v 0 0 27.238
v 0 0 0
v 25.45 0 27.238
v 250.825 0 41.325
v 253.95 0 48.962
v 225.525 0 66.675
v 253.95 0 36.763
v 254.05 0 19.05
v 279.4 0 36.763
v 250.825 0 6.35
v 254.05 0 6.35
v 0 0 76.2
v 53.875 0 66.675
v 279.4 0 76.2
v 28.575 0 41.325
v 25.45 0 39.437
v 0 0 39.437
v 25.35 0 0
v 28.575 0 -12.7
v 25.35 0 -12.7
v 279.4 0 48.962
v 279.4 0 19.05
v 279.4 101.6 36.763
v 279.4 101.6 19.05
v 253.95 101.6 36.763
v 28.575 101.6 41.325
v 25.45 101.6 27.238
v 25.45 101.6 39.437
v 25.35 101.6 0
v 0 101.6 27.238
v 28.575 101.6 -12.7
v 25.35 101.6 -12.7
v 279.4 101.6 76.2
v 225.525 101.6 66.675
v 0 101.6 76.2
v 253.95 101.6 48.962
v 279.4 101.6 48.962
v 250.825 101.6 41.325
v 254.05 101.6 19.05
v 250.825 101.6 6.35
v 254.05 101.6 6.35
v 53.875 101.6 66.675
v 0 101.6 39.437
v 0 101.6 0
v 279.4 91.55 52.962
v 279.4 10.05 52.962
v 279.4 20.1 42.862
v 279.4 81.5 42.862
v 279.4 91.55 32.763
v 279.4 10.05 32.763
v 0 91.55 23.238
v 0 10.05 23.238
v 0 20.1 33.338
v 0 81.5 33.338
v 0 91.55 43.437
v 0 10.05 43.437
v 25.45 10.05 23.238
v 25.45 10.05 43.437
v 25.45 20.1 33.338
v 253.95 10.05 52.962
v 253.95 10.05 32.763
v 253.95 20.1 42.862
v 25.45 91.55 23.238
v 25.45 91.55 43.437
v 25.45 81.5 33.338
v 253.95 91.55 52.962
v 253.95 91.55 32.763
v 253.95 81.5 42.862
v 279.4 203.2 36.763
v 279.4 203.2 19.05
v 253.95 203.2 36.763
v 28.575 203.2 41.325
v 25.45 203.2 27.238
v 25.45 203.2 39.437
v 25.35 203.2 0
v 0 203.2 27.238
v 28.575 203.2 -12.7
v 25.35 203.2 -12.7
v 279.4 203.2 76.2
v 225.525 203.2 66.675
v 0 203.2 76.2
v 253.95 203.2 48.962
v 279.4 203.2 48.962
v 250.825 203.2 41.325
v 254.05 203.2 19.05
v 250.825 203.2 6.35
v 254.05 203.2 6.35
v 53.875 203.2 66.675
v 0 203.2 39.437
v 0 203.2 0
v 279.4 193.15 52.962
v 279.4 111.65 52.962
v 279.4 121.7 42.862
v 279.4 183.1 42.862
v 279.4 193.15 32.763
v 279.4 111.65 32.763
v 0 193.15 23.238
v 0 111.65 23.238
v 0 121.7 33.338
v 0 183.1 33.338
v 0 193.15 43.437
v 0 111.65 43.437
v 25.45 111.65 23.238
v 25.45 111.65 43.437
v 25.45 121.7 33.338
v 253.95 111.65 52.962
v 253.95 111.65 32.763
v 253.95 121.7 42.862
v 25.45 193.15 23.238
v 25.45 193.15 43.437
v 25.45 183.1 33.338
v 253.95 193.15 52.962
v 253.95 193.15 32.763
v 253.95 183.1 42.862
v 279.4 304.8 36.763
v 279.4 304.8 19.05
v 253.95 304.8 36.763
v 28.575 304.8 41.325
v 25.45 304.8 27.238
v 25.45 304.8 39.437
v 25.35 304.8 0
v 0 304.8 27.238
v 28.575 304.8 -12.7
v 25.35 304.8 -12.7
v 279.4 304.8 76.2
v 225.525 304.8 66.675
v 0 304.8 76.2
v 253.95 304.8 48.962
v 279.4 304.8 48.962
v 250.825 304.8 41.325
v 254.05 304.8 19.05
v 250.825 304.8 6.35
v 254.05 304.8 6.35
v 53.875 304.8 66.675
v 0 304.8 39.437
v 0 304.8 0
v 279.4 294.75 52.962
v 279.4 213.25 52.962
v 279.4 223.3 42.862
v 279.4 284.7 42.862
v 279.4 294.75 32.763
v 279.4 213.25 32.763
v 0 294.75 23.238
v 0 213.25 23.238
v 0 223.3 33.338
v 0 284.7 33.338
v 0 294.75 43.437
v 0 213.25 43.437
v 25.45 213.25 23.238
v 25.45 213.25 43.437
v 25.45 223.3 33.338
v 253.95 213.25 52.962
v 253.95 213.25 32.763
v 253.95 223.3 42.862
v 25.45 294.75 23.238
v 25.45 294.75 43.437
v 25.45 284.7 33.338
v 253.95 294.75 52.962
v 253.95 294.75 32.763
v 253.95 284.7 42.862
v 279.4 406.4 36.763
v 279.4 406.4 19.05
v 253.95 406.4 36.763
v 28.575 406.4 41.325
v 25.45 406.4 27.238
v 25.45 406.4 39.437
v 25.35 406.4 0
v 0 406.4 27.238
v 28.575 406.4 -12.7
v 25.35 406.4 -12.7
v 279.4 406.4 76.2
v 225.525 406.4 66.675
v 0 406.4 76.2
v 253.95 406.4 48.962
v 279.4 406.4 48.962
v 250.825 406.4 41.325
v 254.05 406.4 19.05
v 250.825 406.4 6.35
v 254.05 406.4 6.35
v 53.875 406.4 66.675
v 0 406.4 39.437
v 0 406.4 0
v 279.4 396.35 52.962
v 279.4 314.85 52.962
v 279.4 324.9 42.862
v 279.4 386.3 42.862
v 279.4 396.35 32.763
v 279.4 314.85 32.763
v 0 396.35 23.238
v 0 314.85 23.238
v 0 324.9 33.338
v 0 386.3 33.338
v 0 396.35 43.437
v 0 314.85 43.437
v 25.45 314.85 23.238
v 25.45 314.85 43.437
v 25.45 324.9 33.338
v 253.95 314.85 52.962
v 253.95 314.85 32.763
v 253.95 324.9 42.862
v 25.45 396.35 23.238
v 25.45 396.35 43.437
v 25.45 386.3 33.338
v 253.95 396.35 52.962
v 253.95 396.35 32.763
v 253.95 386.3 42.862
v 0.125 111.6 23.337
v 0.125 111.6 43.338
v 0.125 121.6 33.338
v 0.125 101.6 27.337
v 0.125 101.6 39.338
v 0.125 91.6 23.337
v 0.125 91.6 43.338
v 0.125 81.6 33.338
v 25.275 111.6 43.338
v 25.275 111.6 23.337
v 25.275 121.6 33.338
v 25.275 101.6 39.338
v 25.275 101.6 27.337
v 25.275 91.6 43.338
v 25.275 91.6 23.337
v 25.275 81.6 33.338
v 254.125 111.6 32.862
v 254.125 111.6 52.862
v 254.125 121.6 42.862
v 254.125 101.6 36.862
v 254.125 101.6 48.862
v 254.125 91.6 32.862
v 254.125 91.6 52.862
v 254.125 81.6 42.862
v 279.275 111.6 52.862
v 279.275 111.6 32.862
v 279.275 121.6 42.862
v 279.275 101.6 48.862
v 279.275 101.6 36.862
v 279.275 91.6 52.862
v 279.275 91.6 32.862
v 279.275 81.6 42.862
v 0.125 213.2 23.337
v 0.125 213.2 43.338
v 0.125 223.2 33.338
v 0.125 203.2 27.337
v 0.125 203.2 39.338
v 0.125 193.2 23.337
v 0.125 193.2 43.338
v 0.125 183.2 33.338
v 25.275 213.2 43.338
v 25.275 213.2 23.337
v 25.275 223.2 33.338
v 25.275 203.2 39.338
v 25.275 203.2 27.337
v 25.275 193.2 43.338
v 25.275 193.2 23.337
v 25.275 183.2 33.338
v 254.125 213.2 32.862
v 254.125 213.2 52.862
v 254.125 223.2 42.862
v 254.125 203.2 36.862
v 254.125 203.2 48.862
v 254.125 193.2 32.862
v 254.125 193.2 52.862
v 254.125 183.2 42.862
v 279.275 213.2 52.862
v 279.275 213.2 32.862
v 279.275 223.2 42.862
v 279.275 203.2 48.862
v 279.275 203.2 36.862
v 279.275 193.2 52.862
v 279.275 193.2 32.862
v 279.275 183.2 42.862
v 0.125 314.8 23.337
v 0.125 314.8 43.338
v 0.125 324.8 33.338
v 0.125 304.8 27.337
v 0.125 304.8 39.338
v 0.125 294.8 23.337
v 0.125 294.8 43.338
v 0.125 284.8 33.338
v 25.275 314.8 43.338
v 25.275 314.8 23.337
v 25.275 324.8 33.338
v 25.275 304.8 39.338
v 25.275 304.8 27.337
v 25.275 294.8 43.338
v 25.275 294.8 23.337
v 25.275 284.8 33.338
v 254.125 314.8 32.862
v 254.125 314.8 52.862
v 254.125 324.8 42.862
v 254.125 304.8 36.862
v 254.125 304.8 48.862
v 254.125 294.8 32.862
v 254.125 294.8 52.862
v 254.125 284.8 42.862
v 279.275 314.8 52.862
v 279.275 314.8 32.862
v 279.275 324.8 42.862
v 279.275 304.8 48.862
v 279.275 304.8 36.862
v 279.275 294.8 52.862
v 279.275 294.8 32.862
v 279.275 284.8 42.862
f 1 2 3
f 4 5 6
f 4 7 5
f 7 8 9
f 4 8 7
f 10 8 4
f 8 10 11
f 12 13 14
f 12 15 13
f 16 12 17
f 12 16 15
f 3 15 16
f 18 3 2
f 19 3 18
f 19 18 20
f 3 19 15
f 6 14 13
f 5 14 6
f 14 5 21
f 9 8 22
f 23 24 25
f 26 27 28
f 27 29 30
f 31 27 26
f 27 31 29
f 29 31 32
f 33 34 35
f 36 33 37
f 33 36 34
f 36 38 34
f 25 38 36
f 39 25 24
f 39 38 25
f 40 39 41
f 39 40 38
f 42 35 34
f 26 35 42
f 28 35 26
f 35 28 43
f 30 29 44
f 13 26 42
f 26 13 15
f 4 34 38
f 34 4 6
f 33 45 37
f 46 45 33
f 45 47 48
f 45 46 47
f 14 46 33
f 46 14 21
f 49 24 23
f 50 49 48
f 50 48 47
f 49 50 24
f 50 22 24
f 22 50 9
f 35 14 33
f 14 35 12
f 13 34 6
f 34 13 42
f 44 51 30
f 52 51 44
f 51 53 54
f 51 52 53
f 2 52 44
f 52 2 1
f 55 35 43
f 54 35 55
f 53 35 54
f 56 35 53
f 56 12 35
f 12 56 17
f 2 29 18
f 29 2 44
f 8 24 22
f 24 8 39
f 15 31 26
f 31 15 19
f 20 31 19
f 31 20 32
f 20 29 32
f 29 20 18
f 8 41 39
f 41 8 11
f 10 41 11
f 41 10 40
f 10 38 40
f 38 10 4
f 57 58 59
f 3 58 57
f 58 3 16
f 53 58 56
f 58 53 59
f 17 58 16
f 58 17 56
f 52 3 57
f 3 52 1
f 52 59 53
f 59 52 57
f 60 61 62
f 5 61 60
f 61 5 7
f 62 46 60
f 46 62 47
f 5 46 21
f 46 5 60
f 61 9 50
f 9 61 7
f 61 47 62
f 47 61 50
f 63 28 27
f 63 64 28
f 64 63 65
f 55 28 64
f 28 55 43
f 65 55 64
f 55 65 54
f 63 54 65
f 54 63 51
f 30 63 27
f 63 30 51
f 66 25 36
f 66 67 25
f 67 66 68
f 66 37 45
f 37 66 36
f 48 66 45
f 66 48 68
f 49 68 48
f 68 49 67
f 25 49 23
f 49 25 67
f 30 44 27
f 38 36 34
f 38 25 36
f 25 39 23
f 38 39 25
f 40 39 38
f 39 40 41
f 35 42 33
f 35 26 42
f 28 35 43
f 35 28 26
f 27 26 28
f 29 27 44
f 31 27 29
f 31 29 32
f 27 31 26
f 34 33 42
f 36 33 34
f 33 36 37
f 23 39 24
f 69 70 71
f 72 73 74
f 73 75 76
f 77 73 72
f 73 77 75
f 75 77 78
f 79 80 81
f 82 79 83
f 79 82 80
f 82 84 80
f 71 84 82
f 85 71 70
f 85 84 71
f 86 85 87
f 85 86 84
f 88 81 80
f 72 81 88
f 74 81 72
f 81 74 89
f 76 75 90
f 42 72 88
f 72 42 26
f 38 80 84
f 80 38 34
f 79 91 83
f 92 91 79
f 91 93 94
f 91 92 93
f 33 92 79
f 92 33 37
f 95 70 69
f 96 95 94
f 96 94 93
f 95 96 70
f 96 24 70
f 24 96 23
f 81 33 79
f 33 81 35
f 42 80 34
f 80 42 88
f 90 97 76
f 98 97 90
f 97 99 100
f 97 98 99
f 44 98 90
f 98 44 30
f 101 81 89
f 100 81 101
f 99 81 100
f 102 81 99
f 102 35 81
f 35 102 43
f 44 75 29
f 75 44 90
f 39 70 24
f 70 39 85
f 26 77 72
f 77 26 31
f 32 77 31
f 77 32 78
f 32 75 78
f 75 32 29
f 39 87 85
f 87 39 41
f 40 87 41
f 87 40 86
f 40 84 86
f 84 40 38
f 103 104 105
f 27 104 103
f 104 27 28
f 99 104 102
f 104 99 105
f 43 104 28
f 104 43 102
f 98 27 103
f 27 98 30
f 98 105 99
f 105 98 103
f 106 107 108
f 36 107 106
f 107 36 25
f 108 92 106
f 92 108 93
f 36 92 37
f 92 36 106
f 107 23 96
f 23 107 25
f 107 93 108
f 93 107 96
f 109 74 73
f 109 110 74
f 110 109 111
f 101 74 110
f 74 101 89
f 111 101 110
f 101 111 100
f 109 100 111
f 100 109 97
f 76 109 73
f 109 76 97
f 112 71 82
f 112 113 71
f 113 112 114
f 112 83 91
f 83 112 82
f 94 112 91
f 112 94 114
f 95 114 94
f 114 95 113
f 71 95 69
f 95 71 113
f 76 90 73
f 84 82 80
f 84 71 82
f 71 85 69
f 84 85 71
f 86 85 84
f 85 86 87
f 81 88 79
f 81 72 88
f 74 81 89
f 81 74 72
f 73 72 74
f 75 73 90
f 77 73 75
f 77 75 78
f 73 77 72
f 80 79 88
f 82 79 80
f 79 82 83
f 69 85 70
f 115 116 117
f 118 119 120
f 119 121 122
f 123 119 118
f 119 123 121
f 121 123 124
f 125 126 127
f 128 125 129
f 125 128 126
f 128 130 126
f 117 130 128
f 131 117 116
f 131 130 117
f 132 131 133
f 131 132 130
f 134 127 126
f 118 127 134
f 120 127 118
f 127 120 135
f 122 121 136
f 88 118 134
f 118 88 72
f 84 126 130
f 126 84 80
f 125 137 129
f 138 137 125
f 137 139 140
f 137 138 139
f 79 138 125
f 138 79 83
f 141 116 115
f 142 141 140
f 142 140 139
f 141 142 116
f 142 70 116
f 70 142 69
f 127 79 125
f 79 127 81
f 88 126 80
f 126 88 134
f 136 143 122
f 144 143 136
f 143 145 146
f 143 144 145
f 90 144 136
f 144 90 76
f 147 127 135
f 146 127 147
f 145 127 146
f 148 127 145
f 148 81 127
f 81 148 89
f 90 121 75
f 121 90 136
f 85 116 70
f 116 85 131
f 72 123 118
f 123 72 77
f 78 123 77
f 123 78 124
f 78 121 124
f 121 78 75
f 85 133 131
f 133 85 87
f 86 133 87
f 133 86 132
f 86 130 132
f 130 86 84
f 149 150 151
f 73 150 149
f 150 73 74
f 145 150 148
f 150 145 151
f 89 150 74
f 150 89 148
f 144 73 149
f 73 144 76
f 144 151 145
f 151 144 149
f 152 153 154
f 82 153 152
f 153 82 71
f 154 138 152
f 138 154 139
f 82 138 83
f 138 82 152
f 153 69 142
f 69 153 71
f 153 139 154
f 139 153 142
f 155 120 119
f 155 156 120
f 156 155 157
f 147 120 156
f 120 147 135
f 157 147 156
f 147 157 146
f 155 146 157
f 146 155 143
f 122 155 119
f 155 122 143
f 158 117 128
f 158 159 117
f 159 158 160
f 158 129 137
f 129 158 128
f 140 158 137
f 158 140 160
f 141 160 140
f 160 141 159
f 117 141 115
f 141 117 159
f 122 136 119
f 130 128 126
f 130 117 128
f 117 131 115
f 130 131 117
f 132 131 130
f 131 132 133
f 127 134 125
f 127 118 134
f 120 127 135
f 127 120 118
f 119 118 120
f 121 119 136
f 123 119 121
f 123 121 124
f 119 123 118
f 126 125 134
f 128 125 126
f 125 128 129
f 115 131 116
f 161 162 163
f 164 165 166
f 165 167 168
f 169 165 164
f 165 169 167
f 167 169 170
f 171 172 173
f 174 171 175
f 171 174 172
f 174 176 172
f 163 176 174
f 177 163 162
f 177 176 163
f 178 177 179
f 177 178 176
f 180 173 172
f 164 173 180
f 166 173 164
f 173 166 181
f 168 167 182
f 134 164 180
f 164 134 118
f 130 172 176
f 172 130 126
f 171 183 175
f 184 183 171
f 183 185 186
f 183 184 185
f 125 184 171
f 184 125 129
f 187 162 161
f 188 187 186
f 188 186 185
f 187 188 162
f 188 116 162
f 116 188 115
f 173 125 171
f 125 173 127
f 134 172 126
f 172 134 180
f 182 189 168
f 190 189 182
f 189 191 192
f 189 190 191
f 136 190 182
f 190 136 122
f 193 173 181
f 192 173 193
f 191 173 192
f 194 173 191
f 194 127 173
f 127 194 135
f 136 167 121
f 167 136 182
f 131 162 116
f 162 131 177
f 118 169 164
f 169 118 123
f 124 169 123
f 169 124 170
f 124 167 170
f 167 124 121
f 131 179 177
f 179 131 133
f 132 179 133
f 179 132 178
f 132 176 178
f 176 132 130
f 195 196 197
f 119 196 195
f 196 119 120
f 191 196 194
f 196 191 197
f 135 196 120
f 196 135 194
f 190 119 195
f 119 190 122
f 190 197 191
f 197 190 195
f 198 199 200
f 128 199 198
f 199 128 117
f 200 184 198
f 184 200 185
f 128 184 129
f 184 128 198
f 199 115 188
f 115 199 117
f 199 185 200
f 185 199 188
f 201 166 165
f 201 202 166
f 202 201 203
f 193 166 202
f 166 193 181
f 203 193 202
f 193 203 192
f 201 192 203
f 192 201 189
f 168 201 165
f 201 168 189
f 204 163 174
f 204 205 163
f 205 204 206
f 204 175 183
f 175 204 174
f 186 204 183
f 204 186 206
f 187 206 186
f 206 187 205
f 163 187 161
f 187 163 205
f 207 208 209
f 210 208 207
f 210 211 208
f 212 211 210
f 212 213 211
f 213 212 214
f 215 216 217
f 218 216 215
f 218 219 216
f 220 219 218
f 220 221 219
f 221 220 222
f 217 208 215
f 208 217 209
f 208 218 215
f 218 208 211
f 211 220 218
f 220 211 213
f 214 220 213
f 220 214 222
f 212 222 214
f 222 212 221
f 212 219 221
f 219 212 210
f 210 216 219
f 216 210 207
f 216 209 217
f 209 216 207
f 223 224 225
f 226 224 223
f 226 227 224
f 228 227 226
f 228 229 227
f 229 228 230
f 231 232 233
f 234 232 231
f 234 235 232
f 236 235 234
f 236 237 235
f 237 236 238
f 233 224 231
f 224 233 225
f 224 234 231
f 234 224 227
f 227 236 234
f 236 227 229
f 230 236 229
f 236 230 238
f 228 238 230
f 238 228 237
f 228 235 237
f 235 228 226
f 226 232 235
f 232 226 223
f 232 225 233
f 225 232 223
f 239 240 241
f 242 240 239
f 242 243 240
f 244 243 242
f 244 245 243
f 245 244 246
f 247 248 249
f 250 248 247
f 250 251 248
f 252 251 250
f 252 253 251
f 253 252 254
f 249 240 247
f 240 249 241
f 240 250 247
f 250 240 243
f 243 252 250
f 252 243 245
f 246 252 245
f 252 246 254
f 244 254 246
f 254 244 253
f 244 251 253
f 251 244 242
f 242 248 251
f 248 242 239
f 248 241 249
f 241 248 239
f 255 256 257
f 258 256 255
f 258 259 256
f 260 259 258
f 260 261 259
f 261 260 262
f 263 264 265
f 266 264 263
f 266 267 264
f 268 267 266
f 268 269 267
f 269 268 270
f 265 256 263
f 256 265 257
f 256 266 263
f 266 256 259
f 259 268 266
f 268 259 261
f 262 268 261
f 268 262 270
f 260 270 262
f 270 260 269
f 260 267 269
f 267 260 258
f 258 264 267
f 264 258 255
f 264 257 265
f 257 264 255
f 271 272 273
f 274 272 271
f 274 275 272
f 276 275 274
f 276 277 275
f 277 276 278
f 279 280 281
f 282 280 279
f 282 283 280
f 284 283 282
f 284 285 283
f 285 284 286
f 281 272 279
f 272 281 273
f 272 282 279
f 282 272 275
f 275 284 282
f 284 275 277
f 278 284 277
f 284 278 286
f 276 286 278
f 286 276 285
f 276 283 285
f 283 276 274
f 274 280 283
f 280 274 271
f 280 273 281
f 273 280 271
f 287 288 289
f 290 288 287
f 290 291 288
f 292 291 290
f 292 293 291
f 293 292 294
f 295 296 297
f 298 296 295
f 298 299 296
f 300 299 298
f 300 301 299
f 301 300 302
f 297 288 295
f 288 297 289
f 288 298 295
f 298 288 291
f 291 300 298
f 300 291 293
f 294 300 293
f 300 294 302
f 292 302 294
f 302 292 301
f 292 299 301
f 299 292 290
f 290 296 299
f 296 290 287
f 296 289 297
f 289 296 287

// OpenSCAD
/*
 * Modular desk extender
 *
 * Flatpak STL exports (run from this file's directory):
 *   flatpak run org.openscad.OpenSCAD -o desk-extender-chunk.stl -D 'part="chunk"' desk_extender.scad
 *   flatpak run org.openscad.OpenSCAD -o desk-extender-keys.stl -D 'part="keys"' desk_extender.scad
 *   flatpak run org.openscad.OpenSCAD -o desk-extender-fit-test.stl -D 'part="fit_test"' desk_extender.scad
 *
 * Coordinate system in the assembled preview:
 *   X = chest of drawers (left) to electronics desk (right)
 *   Y = front of the furniture to the AS/400
 *   Z = height above the chest of drawers
 *
 * Set `part` to "chunk", "keys", or "fit_test" before exporting an STL.
 */

$fn = 48;

part = "assembled"; // [assembled, chunk, keys, fit_test]

// Assembly configuration
chunk_count = 4;
chunk_depth_in = 4;

// Measured furniture geometry
gap_width_in = 9;
left_overlap_in = 1;
right_overlap_in = 1;
target_rise_in = 3;
desk_height_difference_in = 0.75;
bridge_thickness_in = 3/8;

// Side-to-side locating lips
locating_lip_depth_in = 1/2;
locating_lip_thickness_in = 1/8;
furniture_edge_clearance = 0; // Confirmed by physical fit test

// Corner gussets
gusset_run_in = 1;
gusset_drop_in = 1;

// Removable bow-tie key tuning (millimeters)
key_length = 40;
key_outer_height = 20;
key_neck_height = 12;
key_side_clearance = 0.20; // Added to overall slot dimensions
key_thickness_clearance = 0.25;

inch = 25.4;
epsilon = 0.05;

gap_width = gap_width_in * inch;
left_overlap = left_overlap_in * inch;
right_overlap = right_overlap_in * inch;
extender_width = left_overlap + gap_width + right_overlap;
target_rise = target_rise_in * inch;
desk_height_difference = desk_height_difference_in * inch;
bridge_thickness = bridge_thickness_in * inch;
locating_lip_depth = locating_lip_depth_in * inch;
locating_lip_thickness = locating_lip_thickness_in * inch;
gusset_run = gusset_run_in * inch;
gusset_drop = gusset_drop_in * inch;
bridge_bottom = target_rise - bridge_thickness;
chunk_depth = chunk_depth_in * inch;
key_thickness = min(left_overlap, right_overlap) - key_thickness_clearance;
left_key_z = bridge_bottom / 2;
right_key_z = (desk_height_difference + bridge_bottom) / 2;

module bridge_solid(depth = chunk_depth) {
    union() {
        // Horizontal load surface.
        translate([0, 0, bridge_bottom])
            cube([extender_width, depth, bridge_thickness]);

        // Left support rests on the 32-inch chest of drawers.
        cube([left_overlap, depth, bridge_bottom + epsilon]);

        // Right support stops 0.75 inch higher to rest on the desk.
        translate([
            left_overlap + gap_width,
            0,
            desk_height_difference
        ])
            cube([
                right_overlap,
                depth,
                bridge_bottom - desk_height_difference + epsilon
            ]);

        // These two lips hang inside the furniture gap and merge into the
        // supports above. They extend below the adjacent furniture tops to
        // prevent the extender shifting sideways into the gap.
        translate([
            left_overlap - epsilon + furniture_edge_clearance,
            0,
            -locating_lip_depth
        ])
            cube([
                locating_lip_thickness + epsilon,
                depth,
                bridge_bottom + locating_lip_depth + epsilon
            ]);

        translate([
            left_overlap + gap_width
                - furniture_edge_clearance
                - locating_lip_thickness,
            0,
            desk_height_difference - locating_lip_depth
        ])
            cube([
                locating_lip_thickness + epsilon,
                depth,
                bridge_bottom
                    - desk_height_difference
                    + locating_lip_depth
                    + epsilon
            ]);

        continuous_gussets(depth);
    }
}

// Extrudes a polygon drawn in X/Z coordinates along the Y axis.
module xz_prism(points, y, thickness) {
    multmatrix([
        [1, 0, 0, 0],
        [0, 0, 1, y],
        [0, 1, 0, 0],
        [0, 0, 0, 1]
    ])
        linear_extrude(height = thickness)
            polygon(points);
}

module continuous_gussets(depth) {
    left_anchor = left_overlap + locating_lip_thickness - epsilon;
    right_anchor = left_overlap + gap_width - locating_lip_thickness + epsilon;

    xz_prism([
        [left_anchor, bridge_bottom + epsilon],
        [left_anchor + gusset_run, bridge_bottom + epsilon],
        [left_anchor, bridge_bottom - gusset_drop]
    ], 0, depth);

    xz_prism([
        [right_anchor, bridge_bottom + epsilon],
        [right_anchor, bridge_bottom - gusset_drop],
        [right_anchor - gusset_run, bridge_bottom + epsilon]
    ], 0, depth);
}

function bow_tie_points(length, outer_height, neck_height) = [
    [-length / 2, 0],
    [-length / 4,  outer_height / 2],
    [0,             neck_height / 2],
    [length / 4,   outer_height / 2],
    [length / 2,   0],
    [length / 4,  -outer_height / 2],
    [0,            -neck_height / 2],
    [-length / 4, -outer_height / 2]
];

// Extrudes a Y/Z bow-tie profile along X.
module bow_tie_prism(
    x,
    y,
    z,
    thickness,
    length = key_length,
    outer_height = key_outer_height,
    neck_height = key_neck_height
) {
    multmatrix([
        [0, 0, 1, x],
        [1, 0, 0, y],
        [0, 1, 0, z],
        [0, 0, 0, 1]
    ])
        linear_extrude(height = thickness)
            polygon(bow_tie_points(length, outer_height, neck_height));
}

module key_slot_pair(y) {
    slot_length = key_length + key_side_clearance;
    slot_outer_height = key_outer_height + key_side_clearance;
    slot_neck_height = key_neck_height + key_side_clearance;

    bow_tie_prism(
        -epsilon,
        y,
        left_key_z,
        left_overlap + 2 * epsilon,
        slot_length,
        slot_outer_height,
        slot_neck_height
    );
    bow_tie_prism(
        left_overlap + gap_width - epsilon,
        y,
        right_key_z,
        right_overlap + 2 * epsilon,
        slot_length,
        slot_outer_height,
        slot_neck_height
    );
}

module chunk_installed(depth = chunk_depth) {
    difference() {
        bridge_solid(depth);

        // Each end contains half of two bow-tie slots. Neighboring halves form
        // complete slots when identical chunks are placed together. The buried
        // ends taper to points so the slot closes gradually without bridging.
        key_slot_pair(0);
        key_slot_pair(depth);
    }
}

module bow_tie_key_installed(x, y, z) {
    bow_tie_prism(x, y, z, key_thickness);
}

module assembled() {
    for (index = [0 : chunk_count - 1])
        translate([0, index * chunk_depth, 0])
            chunk_installed();

    // Show two removable bow-tie keys at every seam.
    color("DimGray")
        for (seam = [1 : chunk_count - 1])
            for (side = [0 : 1]) {
                key_x = side == 0
                    ? key_thickness_clearance / 2
                    : left_overlap + gap_width + key_thickness_clearance / 2;
                key_z = side == 0 ? left_key_z : right_key_z;
                bow_tie_key_installed(
                    key_x,
                    seam * chunk_depth,
                    key_z
                );
            }
}

module chunk_for_printing() {
    // The front/back cross-section sits on the bed. This orientation avoids
    // trying to print a nine-inch horizontal bridge in midair.
    translate([0, target_rise, 0])
        rotate([90, 0, 0])
            chunk_installed();
}

module bow_tie_key_for_printing() {
    linear_extrude(height = key_thickness)
        polygon(bow_tie_points(
            key_length,
            key_outer_height,
            key_neck_height
        ));
}

module keys_for_printing() {
    keys_needed = 2 * (chunk_count - 1);
    spacing_x = key_length + 6;
    spacing_y = key_outer_height + 6;
    columns = 3;

    for (index = [0 : keys_needed - 1])
        translate([
            (index % columns) * spacing_x + key_length / 2,
            floor(index / columns) * spacing_y + key_outer_height / 2,
            0
        ])
            bow_tie_key_for_printing();
}

module connector_fit_test() {
    coupon_margin = 5;
    coupon_width = key_length + 2 * coupon_margin;
    coupon_depth = key_outer_height + 2 * coupon_margin;
    coupon_thickness = min(left_overlap, right_overlap);

    difference() {
        cube([coupon_width, coupon_depth, coupon_thickness]);
        translate([coupon_width / 2, coupon_depth / 2, -epsilon])
            linear_extrude(height = coupon_thickness + 2 * epsilon)
                polygon(bow_tie_points(
                    key_length + key_side_clearance,
                    key_outer_height + key_side_clearance,
                    key_neck_height + key_side_clearance
                ));
    }

    translate([
        coupon_width + 8 + key_length / 2,
        key_outer_height / 2,
        0
    ])
        bow_tie_key_for_printing();
}

if (part == "assembled") {
    assembled();
} else if (part == "chunk") {
    chunk_for_printing();
} else if (part == "keys") {
    keys_for_printing();
} else if (part == "fit_test") {
    connector_fit_test();
}
